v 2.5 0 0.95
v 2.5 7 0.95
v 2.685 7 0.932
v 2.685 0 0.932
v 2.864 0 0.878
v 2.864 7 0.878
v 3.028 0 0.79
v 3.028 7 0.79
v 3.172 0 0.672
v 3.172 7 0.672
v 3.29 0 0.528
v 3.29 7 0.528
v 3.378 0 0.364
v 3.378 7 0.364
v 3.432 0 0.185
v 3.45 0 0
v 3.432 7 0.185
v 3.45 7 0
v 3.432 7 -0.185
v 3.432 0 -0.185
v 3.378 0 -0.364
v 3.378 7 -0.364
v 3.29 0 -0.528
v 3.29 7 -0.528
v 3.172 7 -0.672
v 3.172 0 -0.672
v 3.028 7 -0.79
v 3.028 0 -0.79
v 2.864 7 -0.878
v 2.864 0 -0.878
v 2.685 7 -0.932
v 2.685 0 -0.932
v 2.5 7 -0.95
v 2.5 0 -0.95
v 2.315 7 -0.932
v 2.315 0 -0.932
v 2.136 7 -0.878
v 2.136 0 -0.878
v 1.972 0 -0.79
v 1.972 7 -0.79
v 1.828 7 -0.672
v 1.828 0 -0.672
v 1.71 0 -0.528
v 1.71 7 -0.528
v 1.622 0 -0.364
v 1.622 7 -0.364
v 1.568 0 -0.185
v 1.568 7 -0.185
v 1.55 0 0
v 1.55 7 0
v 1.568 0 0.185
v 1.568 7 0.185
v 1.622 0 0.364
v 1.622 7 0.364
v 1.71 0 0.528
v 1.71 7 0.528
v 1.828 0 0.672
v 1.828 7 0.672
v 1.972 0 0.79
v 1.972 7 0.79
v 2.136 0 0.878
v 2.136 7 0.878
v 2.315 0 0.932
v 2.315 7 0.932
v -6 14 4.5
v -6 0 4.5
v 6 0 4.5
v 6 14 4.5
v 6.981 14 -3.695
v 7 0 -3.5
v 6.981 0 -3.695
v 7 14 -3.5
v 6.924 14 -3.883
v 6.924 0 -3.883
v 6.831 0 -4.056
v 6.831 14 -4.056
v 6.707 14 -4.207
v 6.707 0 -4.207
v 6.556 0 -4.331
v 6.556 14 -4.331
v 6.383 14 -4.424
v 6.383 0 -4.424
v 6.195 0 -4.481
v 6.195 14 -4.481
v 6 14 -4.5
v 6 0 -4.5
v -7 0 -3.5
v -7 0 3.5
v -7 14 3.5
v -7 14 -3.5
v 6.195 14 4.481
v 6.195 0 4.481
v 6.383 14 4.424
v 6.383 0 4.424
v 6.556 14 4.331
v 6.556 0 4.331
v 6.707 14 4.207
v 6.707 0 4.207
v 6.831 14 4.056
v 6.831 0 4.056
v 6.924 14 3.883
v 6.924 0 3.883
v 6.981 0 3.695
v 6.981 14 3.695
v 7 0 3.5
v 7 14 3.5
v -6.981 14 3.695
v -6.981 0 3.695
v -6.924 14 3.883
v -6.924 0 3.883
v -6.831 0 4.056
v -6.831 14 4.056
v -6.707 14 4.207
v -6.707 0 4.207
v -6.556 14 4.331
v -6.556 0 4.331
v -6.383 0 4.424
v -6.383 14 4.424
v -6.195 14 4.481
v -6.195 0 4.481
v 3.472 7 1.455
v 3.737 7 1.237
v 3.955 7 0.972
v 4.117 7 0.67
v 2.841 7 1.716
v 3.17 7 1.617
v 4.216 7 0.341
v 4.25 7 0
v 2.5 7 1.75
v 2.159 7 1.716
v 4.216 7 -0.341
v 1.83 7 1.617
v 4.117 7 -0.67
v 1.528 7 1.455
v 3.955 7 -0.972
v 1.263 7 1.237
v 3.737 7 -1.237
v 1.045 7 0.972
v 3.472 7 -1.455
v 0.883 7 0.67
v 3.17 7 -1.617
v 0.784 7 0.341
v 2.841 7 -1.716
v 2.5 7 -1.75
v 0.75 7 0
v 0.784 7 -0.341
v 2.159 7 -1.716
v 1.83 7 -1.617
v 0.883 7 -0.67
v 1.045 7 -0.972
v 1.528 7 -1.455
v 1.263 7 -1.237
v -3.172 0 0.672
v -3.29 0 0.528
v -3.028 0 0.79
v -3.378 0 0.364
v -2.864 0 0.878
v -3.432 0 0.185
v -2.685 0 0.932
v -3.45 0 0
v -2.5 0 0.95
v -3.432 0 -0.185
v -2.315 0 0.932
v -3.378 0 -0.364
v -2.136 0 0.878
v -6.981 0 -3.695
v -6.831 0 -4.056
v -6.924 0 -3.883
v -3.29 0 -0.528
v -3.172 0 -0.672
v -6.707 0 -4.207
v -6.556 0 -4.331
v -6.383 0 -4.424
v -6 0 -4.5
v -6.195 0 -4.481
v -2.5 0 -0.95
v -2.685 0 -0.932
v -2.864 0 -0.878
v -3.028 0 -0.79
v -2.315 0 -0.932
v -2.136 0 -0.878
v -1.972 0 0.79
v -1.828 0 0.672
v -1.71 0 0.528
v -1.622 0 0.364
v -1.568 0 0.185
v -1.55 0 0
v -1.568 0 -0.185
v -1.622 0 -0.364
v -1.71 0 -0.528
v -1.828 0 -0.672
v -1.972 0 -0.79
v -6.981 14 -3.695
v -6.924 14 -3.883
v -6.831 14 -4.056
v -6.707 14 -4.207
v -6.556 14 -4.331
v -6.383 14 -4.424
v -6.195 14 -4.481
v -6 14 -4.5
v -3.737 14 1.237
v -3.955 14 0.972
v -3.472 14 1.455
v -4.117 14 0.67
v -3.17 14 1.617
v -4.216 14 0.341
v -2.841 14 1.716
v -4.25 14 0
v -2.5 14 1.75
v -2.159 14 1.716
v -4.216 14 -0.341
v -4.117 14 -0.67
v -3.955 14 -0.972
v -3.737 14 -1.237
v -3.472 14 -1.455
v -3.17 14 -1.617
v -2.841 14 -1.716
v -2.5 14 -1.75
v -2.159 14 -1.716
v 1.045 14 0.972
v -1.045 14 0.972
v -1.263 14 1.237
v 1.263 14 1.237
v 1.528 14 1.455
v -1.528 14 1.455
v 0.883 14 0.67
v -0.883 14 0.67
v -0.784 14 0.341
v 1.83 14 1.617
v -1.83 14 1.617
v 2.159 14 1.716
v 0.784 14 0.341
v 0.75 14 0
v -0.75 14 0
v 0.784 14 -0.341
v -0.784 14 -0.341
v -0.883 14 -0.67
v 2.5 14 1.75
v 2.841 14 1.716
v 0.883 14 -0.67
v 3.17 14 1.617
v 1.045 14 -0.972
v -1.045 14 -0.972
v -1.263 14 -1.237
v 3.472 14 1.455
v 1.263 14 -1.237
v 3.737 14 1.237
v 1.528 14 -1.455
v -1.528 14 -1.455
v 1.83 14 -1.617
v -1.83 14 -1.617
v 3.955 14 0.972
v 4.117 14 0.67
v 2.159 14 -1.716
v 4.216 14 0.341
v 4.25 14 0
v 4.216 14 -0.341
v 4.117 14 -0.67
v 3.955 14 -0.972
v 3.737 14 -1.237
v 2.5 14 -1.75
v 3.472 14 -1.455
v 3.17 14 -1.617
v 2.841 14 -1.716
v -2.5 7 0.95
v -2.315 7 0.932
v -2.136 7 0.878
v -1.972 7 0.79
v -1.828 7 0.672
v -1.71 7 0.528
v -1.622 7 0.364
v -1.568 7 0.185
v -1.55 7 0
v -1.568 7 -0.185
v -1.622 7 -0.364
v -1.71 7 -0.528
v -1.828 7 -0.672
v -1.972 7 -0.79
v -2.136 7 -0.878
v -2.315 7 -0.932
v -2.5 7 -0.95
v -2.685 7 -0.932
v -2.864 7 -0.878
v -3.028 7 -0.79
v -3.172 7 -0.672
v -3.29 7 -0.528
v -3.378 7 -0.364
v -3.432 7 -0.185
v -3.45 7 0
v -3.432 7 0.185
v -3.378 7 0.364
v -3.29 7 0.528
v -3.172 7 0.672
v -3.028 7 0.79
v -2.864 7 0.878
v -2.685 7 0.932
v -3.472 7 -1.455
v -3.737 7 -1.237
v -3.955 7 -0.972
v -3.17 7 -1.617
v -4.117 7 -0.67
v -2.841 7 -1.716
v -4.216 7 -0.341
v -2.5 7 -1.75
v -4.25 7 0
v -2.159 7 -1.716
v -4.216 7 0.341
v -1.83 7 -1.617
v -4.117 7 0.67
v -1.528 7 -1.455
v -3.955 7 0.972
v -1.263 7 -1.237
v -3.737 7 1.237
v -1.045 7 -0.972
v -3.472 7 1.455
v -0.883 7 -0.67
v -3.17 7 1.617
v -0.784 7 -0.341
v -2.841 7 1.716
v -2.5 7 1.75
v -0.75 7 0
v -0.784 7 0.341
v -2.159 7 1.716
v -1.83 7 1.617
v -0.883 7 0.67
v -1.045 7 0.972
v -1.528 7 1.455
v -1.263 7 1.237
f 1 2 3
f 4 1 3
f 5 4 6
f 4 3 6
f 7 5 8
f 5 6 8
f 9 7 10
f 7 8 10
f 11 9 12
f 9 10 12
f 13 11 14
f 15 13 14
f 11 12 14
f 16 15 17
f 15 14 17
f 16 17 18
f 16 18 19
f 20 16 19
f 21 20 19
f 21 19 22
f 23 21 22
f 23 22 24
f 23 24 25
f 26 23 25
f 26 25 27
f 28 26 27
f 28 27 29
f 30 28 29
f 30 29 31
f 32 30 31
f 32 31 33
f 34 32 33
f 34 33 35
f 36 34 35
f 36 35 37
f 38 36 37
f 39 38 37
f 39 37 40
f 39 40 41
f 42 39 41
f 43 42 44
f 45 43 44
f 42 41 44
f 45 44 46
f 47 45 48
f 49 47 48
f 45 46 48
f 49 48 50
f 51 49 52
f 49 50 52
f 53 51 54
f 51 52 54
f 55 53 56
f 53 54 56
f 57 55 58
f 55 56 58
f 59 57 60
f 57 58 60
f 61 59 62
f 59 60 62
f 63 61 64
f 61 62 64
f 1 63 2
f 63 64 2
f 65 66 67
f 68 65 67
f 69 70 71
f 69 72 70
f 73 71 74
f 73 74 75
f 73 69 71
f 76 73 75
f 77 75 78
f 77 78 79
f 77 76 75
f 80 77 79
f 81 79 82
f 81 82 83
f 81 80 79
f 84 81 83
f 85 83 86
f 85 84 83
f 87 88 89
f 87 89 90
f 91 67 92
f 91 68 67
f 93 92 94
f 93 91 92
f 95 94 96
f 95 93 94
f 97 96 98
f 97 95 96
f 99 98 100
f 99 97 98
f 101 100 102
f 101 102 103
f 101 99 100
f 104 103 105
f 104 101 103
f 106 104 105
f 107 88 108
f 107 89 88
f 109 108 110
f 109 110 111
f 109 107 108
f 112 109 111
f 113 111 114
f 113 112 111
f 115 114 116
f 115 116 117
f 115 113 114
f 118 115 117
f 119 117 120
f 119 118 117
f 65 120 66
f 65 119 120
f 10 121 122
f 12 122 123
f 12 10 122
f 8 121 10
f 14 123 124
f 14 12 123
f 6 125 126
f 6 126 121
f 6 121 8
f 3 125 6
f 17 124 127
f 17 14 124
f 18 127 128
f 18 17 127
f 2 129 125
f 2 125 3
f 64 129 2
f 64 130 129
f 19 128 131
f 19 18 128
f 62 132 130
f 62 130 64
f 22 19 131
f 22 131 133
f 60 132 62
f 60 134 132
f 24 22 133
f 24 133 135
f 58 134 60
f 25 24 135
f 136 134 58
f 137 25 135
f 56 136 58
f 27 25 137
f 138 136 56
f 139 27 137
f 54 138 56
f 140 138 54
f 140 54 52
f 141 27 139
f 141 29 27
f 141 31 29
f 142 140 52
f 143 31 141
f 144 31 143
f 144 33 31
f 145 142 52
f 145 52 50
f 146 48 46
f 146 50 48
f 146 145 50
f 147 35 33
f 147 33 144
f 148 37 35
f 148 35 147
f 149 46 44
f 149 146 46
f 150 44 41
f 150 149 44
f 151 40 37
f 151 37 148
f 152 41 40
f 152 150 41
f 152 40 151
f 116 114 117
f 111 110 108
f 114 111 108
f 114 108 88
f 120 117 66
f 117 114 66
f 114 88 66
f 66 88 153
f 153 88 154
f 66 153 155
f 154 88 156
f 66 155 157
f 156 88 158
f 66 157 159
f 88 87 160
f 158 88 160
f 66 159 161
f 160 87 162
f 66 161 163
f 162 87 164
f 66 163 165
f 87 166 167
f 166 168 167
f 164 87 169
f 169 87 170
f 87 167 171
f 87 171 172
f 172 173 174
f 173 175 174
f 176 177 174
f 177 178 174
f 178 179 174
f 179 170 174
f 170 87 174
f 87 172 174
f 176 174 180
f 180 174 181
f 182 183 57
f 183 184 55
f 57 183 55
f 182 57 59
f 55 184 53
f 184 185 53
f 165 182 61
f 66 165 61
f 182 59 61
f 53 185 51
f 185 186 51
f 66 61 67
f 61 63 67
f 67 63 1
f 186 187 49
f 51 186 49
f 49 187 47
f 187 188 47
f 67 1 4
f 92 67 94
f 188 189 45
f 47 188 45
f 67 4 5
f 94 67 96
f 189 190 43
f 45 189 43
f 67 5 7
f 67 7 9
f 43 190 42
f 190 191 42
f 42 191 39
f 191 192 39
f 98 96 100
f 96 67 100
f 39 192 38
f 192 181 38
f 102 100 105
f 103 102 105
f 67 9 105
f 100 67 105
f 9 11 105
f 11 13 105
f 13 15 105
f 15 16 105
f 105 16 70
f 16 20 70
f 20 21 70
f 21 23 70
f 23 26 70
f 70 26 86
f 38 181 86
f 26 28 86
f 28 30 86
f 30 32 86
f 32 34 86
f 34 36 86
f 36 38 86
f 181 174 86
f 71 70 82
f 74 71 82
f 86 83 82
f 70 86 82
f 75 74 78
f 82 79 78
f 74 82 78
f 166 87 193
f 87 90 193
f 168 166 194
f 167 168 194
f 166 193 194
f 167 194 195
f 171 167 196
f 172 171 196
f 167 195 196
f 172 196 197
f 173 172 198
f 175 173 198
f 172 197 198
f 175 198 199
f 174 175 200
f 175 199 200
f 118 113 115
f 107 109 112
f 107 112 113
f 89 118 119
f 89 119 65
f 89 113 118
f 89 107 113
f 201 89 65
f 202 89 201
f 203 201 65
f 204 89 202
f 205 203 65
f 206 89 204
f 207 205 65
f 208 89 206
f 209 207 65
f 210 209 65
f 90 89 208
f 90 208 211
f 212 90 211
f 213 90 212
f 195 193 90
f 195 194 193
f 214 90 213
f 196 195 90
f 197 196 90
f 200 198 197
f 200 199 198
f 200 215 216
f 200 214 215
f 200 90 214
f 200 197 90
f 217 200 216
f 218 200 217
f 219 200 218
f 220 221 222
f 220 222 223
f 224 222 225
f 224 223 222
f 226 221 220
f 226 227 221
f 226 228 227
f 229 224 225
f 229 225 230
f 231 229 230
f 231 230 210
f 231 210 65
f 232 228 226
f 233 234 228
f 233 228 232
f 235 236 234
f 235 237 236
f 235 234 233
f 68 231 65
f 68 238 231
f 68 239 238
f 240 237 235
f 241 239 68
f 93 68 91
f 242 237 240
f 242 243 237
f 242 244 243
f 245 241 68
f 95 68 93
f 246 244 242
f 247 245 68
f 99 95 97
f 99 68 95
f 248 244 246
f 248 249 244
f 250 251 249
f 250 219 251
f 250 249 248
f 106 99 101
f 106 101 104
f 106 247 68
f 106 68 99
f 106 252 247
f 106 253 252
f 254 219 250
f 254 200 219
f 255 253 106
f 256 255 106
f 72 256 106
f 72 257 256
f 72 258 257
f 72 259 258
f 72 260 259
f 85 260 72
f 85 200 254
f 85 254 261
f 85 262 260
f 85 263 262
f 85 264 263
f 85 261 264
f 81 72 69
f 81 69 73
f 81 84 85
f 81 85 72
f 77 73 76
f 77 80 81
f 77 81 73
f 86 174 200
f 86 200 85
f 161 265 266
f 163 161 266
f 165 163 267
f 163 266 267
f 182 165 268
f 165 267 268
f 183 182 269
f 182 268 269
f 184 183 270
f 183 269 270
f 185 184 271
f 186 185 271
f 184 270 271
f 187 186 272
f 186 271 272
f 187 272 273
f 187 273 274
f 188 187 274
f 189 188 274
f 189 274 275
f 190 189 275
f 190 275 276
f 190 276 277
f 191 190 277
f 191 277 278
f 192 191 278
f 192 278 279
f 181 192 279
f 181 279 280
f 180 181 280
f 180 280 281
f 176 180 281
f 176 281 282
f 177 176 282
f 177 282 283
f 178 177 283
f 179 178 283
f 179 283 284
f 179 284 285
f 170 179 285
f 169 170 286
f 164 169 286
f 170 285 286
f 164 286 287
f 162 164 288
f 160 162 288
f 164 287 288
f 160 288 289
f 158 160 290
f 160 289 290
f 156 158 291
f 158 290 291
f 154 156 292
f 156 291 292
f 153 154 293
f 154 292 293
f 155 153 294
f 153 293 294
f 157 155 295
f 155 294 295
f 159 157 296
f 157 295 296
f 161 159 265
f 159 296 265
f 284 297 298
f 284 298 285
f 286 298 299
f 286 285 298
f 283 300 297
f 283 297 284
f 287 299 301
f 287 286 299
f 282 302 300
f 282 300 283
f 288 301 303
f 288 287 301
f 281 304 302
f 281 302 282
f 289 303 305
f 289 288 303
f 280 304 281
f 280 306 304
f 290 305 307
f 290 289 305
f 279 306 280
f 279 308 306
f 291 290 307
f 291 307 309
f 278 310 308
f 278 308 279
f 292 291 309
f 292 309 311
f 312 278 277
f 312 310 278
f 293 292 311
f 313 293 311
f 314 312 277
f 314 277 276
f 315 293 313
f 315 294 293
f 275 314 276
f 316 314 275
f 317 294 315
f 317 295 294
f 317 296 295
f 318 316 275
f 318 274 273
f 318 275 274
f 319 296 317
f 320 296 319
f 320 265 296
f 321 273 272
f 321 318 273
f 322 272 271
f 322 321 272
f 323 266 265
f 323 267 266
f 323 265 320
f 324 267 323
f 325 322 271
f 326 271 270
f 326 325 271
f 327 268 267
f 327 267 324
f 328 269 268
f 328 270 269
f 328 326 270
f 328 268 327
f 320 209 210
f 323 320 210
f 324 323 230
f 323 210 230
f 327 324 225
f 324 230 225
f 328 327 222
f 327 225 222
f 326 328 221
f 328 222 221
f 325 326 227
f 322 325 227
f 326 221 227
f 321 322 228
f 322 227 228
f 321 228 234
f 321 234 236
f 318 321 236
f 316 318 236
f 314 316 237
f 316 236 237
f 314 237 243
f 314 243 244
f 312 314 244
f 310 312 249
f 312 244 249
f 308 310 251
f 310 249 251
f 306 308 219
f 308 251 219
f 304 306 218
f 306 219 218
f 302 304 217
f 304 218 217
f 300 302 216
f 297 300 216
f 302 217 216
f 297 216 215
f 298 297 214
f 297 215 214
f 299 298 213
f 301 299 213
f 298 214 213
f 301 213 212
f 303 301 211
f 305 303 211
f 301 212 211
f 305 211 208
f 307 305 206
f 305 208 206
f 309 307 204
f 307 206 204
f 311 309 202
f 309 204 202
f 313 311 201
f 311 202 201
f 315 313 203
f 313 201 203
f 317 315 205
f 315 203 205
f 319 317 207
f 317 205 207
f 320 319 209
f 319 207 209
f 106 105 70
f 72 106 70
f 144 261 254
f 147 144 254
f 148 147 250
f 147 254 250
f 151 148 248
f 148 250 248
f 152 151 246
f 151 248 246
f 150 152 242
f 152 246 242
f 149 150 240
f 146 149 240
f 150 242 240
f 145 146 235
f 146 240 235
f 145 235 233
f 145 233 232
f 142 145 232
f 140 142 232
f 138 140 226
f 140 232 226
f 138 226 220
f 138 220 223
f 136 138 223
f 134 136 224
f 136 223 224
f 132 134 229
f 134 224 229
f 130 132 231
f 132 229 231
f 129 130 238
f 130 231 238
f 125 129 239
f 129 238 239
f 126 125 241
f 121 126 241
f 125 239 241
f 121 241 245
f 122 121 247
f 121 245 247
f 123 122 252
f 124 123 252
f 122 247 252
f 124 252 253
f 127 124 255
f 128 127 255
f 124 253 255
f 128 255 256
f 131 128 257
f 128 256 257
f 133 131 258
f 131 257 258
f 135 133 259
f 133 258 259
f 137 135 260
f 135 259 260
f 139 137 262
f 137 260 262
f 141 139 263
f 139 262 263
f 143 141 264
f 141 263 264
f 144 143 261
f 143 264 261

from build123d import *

# Parameters (mm, degrees)
SKETCH_1_W          = 14
SKETCH_1_H          = 9
EXTRUDE_1_DEPTH     = 14
FILLET_1_R          = 1
SKETCH_3_R          = 1.75
CUT_EXTRUDE_2_DEPTH = 7
CUT_EXTRUDE_3_REACH = 12.874
SKETCH_4_R          = 0.95


with BuildPart() as part:
    # 草图1 → 凸台-拉伸1 (new body)
    with BuildSketch(Plane(origin=(0, 0, 0), x_dir=(1, 0, 0), z_dir=(0, 1, 0))):
        Rectangle(SKETCH_1_W, SKETCH_1_H)
    extrude(amount=EXTRUDE_1_DEPTH)

    # 圆角1
    fillet_1_edges = [part.edges().sort_by_distance(p)[0] for p in [
        (7, 7, 4.5),
        (-7, 7, 4.5),
        (-7, 7, -4.5),
        (7, 7, -4.5),
    ]]
    fillet(fillet_1_edges, radius=FILLET_1_R)

    # 草图3 → 切除-拉伸2 (cut)
    with BuildSketch(Plane(origin=(0, 14, 0), x_dir=(1, 0, 0), z_dir=(0, 1, 0))):
        with Locations(Location((-2.5, 0, 0), (0, 0, 270))):
            Circle(SKETCH_3_R)
        with Locations(Location((2.5, 0, 0), (0, 0, 90))):
            Circle(SKETCH_3_R)
    extrude(amount=-CUT_EXTRUDE_2_DEPTH, mode=Mode.SUBTRACT)

    # 草图4 → 切除-拉伸3 (cut, up to next)
    with BuildSketch(Plane(origin=(0, 7, 0), x_dir=(1, 0, 0), z_dir=(0, 1, 0)), mode=Mode.PRIVATE) as cut_extrude_3_sk1:
        with Locations(Location((-2.5, 0, 0), (0, 0, 270))):
            Circle(SKETCH_4_R)
    cut_extrude_3_tool1 = extrude(cut_extrude_3_sk1.sketch, amount=-CUT_EXTRUDE_3_REACH, mode=Mode.PRIVATE) & part.part
    # 草图4 → 切除-拉伸3 (cut, up to next)
    with BuildSketch(Plane(origin=(0, 7, 0), x_dir=(1, 0, 0), z_dir=(0, 1, 0)), mode=Mode.PRIVATE) as cut_extrude_3_sk2:
        with Locations(Location((2.5, 0, 0), (0, 0, 270))):
            Circle(SKETCH_4_R)
    cut_extrude_3_tool2 = extrude(cut_extrude_3_sk2.sketch, amount=-CUT_EXTRUDE_3_REACH, mode=Mode.PRIVATE) & part.part
    add(cut_extrude_3_tool1.solids().sort_by_distance((-2.5, 7, 0))[0], mode=Mode.SUBTRACT)
    add(cut_extrude_3_tool2.solids().sort_by_distance((2.5, 7, 0))[0], mode=Mode.SUBTRACT)


solid = part.part
